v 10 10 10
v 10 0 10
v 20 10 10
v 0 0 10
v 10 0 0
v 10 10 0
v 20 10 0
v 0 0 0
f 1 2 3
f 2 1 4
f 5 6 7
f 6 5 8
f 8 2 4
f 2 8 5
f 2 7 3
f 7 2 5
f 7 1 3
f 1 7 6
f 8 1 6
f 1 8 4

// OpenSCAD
/*skew takes an array of six angles:
 *x along y
 *x along z
 *y along x
 *y along z
 *z along x
 *z along y
 */
module skew(dims) {
matrix = [
	[ 1, dims[0]/45, dims[1]/45, 0 ],
	[ dims[2]/45, 1, dims[4]/45, 0 ],
	[ dims[5]/45, dims[3]/45, 1, 0 ],
	[ 0, 0, 0, 1 ]
];
multmatrix(matrix)
children();
}

skew([45, 0, 0, 0, 0, 0])
cube([10,10,10]);
